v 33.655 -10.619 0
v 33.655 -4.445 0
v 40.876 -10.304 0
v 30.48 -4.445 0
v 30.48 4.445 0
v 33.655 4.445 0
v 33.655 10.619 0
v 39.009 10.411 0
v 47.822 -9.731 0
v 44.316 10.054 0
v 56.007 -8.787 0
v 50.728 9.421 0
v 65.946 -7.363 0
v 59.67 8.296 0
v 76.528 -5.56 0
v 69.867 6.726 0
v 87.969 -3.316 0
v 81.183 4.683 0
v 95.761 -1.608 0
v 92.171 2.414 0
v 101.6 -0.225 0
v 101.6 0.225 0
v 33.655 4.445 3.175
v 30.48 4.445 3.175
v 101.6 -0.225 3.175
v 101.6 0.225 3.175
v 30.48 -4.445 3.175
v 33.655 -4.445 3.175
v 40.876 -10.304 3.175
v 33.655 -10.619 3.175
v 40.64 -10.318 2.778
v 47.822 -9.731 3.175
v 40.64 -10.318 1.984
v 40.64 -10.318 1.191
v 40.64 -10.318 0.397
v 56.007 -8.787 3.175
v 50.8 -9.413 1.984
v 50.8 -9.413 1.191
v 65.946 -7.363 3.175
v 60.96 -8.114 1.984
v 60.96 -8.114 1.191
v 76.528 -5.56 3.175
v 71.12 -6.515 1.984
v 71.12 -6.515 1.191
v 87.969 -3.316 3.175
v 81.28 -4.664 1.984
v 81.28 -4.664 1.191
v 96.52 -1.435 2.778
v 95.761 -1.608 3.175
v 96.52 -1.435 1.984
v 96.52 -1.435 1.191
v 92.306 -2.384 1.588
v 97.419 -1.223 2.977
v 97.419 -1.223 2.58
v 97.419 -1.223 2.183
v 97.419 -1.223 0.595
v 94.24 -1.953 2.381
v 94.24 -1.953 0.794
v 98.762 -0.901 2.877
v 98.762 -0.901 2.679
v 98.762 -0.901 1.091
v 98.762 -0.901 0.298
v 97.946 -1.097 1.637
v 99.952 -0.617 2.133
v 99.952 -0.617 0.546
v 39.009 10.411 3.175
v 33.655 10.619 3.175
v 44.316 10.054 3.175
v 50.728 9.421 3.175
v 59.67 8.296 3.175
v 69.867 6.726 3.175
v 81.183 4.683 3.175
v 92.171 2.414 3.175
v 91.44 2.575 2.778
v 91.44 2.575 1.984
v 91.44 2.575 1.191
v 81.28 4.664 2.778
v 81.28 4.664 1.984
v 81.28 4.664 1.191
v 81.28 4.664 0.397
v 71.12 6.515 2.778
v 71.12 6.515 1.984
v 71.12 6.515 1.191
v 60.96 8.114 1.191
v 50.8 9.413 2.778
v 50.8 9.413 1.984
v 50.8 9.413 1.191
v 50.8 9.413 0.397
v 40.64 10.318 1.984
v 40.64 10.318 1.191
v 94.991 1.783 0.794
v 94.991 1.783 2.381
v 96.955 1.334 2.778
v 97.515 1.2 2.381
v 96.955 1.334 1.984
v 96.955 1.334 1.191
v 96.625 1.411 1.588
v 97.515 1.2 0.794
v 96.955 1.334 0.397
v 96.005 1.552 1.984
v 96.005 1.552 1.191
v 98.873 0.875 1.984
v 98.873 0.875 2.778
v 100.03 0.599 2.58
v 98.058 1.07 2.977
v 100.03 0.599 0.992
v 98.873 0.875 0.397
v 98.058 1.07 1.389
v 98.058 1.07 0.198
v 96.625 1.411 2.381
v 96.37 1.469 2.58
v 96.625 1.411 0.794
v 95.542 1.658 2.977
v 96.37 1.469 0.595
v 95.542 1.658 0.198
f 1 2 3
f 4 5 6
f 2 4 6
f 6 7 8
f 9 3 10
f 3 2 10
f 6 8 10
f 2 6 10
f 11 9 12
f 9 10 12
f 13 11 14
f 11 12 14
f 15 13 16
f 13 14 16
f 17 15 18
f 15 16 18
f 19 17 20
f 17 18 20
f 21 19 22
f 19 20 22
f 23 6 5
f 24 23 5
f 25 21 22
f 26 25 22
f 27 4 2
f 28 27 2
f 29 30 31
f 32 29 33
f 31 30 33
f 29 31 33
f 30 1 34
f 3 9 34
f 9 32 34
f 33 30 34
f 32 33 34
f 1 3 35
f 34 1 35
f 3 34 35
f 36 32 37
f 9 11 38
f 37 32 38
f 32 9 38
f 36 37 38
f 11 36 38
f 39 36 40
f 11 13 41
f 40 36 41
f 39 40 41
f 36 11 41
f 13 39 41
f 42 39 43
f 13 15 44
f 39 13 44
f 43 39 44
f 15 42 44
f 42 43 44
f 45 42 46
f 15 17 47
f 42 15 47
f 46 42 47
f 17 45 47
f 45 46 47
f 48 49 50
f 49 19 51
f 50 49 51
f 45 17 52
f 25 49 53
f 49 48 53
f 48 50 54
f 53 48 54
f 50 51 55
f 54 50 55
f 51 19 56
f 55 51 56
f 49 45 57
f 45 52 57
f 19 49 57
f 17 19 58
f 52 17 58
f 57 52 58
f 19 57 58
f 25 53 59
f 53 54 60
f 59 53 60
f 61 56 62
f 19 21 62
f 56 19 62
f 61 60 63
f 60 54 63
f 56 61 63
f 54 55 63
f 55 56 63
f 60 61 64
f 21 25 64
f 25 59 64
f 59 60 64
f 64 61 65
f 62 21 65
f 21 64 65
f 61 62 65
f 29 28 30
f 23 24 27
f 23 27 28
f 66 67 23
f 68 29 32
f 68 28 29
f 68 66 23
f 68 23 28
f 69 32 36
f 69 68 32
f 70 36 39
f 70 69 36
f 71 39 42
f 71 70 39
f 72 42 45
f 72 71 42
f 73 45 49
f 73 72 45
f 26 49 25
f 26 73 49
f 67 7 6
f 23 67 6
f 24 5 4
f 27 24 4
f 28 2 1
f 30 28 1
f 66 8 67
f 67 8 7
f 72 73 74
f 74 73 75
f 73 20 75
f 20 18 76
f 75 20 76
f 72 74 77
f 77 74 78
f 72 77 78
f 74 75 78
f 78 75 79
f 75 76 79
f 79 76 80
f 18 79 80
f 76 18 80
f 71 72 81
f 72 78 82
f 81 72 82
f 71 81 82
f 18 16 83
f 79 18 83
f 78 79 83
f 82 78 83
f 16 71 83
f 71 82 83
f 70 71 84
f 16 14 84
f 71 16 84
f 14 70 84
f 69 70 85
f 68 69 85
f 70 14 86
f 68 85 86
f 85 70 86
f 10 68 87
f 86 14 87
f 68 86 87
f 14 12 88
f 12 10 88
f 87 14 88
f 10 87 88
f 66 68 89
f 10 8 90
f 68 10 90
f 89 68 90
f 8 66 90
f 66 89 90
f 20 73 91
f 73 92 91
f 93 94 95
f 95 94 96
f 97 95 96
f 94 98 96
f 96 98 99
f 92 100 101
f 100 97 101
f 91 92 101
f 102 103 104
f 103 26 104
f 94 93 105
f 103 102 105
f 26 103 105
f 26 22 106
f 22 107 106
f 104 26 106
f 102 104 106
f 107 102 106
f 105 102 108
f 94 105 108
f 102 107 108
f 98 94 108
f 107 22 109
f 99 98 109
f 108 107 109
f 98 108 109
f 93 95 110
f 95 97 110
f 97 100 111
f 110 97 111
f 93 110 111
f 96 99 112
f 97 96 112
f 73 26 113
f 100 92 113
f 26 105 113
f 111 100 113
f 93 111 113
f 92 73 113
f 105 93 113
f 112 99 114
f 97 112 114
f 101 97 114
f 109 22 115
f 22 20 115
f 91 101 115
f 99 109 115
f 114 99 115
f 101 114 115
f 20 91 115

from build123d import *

# Parameters (mm, degrees)
F1_DEPTH = 3.175


with BuildPart() as f1:
    # F0 (on Top) → F1 (new body)
    with BuildSketch(Plane.XY):
        with BuildLine():
            Line((101.6, -0.224536), (101.6, 0.224536))
            add(Edge.make_bspline(
                [(101.6, 0.224536), (96.52, 1.434592), (97.928151728, 1.1118290006), (90.7318181321, 2.7613033932), (81.2086848949, 4.7190014757), (71.1474182421, 6.548791401), (60.9840942626, 8.1627459667), (50.7392971205, 9.4738409458), (42.0355898066, 10.3075715865), (35.8574731401, 10.5621488671), (33.655, 10.6191598962)],
                knots=[0, 0, 0, 0, 0.0277729611, 0.0555038819, 0.0946460349, 0.133701981, 0.1726784354, 0.211574615, 0.2503899882, 0.2759080683, 0.2759080683, 0.2759080683, 0.2759080683], degree=3))
            Line((33.655, 10.6191598962), (33.655, 4.445))
            Line((33.655, 4.445), (30.48, 4.445))
            Line((30.48, 4.445), (30.48, -4.445))
            Line((30.48, -4.445), (33.655, -4.445))
            Line((33.655, -4.445), (33.655, -10.6191598962))
            add(Edge.make_bspline(
                [(33.655, -10.6191598962), (35.8574731401, -10.5621488671), (42.0355898066, -10.3075715865), (50.7392971205, -9.4738409458), (60.9840942626, -8.1627459667), (71.1474182421, -6.548791401), (81.2086848949, -4.7190014757), (90.7318181321, -2.7613033932), (97.928151728, -1.1118290006), (96.52, -1.434592), (101.6, -0.224536)],
                knots=[0.7240919317, 0.7240919317, 0.7240919317, 0.7240919317, 0.7496100118, 0.788425385, 0.8273215646, 0.866298019, 0.9053539651, 0.9444961181, 0.9722270389, 1, 1, 1, 1], degree=3))
        make_face()
    extrude(amount=F1_DEPTH)


solid = f1.part
